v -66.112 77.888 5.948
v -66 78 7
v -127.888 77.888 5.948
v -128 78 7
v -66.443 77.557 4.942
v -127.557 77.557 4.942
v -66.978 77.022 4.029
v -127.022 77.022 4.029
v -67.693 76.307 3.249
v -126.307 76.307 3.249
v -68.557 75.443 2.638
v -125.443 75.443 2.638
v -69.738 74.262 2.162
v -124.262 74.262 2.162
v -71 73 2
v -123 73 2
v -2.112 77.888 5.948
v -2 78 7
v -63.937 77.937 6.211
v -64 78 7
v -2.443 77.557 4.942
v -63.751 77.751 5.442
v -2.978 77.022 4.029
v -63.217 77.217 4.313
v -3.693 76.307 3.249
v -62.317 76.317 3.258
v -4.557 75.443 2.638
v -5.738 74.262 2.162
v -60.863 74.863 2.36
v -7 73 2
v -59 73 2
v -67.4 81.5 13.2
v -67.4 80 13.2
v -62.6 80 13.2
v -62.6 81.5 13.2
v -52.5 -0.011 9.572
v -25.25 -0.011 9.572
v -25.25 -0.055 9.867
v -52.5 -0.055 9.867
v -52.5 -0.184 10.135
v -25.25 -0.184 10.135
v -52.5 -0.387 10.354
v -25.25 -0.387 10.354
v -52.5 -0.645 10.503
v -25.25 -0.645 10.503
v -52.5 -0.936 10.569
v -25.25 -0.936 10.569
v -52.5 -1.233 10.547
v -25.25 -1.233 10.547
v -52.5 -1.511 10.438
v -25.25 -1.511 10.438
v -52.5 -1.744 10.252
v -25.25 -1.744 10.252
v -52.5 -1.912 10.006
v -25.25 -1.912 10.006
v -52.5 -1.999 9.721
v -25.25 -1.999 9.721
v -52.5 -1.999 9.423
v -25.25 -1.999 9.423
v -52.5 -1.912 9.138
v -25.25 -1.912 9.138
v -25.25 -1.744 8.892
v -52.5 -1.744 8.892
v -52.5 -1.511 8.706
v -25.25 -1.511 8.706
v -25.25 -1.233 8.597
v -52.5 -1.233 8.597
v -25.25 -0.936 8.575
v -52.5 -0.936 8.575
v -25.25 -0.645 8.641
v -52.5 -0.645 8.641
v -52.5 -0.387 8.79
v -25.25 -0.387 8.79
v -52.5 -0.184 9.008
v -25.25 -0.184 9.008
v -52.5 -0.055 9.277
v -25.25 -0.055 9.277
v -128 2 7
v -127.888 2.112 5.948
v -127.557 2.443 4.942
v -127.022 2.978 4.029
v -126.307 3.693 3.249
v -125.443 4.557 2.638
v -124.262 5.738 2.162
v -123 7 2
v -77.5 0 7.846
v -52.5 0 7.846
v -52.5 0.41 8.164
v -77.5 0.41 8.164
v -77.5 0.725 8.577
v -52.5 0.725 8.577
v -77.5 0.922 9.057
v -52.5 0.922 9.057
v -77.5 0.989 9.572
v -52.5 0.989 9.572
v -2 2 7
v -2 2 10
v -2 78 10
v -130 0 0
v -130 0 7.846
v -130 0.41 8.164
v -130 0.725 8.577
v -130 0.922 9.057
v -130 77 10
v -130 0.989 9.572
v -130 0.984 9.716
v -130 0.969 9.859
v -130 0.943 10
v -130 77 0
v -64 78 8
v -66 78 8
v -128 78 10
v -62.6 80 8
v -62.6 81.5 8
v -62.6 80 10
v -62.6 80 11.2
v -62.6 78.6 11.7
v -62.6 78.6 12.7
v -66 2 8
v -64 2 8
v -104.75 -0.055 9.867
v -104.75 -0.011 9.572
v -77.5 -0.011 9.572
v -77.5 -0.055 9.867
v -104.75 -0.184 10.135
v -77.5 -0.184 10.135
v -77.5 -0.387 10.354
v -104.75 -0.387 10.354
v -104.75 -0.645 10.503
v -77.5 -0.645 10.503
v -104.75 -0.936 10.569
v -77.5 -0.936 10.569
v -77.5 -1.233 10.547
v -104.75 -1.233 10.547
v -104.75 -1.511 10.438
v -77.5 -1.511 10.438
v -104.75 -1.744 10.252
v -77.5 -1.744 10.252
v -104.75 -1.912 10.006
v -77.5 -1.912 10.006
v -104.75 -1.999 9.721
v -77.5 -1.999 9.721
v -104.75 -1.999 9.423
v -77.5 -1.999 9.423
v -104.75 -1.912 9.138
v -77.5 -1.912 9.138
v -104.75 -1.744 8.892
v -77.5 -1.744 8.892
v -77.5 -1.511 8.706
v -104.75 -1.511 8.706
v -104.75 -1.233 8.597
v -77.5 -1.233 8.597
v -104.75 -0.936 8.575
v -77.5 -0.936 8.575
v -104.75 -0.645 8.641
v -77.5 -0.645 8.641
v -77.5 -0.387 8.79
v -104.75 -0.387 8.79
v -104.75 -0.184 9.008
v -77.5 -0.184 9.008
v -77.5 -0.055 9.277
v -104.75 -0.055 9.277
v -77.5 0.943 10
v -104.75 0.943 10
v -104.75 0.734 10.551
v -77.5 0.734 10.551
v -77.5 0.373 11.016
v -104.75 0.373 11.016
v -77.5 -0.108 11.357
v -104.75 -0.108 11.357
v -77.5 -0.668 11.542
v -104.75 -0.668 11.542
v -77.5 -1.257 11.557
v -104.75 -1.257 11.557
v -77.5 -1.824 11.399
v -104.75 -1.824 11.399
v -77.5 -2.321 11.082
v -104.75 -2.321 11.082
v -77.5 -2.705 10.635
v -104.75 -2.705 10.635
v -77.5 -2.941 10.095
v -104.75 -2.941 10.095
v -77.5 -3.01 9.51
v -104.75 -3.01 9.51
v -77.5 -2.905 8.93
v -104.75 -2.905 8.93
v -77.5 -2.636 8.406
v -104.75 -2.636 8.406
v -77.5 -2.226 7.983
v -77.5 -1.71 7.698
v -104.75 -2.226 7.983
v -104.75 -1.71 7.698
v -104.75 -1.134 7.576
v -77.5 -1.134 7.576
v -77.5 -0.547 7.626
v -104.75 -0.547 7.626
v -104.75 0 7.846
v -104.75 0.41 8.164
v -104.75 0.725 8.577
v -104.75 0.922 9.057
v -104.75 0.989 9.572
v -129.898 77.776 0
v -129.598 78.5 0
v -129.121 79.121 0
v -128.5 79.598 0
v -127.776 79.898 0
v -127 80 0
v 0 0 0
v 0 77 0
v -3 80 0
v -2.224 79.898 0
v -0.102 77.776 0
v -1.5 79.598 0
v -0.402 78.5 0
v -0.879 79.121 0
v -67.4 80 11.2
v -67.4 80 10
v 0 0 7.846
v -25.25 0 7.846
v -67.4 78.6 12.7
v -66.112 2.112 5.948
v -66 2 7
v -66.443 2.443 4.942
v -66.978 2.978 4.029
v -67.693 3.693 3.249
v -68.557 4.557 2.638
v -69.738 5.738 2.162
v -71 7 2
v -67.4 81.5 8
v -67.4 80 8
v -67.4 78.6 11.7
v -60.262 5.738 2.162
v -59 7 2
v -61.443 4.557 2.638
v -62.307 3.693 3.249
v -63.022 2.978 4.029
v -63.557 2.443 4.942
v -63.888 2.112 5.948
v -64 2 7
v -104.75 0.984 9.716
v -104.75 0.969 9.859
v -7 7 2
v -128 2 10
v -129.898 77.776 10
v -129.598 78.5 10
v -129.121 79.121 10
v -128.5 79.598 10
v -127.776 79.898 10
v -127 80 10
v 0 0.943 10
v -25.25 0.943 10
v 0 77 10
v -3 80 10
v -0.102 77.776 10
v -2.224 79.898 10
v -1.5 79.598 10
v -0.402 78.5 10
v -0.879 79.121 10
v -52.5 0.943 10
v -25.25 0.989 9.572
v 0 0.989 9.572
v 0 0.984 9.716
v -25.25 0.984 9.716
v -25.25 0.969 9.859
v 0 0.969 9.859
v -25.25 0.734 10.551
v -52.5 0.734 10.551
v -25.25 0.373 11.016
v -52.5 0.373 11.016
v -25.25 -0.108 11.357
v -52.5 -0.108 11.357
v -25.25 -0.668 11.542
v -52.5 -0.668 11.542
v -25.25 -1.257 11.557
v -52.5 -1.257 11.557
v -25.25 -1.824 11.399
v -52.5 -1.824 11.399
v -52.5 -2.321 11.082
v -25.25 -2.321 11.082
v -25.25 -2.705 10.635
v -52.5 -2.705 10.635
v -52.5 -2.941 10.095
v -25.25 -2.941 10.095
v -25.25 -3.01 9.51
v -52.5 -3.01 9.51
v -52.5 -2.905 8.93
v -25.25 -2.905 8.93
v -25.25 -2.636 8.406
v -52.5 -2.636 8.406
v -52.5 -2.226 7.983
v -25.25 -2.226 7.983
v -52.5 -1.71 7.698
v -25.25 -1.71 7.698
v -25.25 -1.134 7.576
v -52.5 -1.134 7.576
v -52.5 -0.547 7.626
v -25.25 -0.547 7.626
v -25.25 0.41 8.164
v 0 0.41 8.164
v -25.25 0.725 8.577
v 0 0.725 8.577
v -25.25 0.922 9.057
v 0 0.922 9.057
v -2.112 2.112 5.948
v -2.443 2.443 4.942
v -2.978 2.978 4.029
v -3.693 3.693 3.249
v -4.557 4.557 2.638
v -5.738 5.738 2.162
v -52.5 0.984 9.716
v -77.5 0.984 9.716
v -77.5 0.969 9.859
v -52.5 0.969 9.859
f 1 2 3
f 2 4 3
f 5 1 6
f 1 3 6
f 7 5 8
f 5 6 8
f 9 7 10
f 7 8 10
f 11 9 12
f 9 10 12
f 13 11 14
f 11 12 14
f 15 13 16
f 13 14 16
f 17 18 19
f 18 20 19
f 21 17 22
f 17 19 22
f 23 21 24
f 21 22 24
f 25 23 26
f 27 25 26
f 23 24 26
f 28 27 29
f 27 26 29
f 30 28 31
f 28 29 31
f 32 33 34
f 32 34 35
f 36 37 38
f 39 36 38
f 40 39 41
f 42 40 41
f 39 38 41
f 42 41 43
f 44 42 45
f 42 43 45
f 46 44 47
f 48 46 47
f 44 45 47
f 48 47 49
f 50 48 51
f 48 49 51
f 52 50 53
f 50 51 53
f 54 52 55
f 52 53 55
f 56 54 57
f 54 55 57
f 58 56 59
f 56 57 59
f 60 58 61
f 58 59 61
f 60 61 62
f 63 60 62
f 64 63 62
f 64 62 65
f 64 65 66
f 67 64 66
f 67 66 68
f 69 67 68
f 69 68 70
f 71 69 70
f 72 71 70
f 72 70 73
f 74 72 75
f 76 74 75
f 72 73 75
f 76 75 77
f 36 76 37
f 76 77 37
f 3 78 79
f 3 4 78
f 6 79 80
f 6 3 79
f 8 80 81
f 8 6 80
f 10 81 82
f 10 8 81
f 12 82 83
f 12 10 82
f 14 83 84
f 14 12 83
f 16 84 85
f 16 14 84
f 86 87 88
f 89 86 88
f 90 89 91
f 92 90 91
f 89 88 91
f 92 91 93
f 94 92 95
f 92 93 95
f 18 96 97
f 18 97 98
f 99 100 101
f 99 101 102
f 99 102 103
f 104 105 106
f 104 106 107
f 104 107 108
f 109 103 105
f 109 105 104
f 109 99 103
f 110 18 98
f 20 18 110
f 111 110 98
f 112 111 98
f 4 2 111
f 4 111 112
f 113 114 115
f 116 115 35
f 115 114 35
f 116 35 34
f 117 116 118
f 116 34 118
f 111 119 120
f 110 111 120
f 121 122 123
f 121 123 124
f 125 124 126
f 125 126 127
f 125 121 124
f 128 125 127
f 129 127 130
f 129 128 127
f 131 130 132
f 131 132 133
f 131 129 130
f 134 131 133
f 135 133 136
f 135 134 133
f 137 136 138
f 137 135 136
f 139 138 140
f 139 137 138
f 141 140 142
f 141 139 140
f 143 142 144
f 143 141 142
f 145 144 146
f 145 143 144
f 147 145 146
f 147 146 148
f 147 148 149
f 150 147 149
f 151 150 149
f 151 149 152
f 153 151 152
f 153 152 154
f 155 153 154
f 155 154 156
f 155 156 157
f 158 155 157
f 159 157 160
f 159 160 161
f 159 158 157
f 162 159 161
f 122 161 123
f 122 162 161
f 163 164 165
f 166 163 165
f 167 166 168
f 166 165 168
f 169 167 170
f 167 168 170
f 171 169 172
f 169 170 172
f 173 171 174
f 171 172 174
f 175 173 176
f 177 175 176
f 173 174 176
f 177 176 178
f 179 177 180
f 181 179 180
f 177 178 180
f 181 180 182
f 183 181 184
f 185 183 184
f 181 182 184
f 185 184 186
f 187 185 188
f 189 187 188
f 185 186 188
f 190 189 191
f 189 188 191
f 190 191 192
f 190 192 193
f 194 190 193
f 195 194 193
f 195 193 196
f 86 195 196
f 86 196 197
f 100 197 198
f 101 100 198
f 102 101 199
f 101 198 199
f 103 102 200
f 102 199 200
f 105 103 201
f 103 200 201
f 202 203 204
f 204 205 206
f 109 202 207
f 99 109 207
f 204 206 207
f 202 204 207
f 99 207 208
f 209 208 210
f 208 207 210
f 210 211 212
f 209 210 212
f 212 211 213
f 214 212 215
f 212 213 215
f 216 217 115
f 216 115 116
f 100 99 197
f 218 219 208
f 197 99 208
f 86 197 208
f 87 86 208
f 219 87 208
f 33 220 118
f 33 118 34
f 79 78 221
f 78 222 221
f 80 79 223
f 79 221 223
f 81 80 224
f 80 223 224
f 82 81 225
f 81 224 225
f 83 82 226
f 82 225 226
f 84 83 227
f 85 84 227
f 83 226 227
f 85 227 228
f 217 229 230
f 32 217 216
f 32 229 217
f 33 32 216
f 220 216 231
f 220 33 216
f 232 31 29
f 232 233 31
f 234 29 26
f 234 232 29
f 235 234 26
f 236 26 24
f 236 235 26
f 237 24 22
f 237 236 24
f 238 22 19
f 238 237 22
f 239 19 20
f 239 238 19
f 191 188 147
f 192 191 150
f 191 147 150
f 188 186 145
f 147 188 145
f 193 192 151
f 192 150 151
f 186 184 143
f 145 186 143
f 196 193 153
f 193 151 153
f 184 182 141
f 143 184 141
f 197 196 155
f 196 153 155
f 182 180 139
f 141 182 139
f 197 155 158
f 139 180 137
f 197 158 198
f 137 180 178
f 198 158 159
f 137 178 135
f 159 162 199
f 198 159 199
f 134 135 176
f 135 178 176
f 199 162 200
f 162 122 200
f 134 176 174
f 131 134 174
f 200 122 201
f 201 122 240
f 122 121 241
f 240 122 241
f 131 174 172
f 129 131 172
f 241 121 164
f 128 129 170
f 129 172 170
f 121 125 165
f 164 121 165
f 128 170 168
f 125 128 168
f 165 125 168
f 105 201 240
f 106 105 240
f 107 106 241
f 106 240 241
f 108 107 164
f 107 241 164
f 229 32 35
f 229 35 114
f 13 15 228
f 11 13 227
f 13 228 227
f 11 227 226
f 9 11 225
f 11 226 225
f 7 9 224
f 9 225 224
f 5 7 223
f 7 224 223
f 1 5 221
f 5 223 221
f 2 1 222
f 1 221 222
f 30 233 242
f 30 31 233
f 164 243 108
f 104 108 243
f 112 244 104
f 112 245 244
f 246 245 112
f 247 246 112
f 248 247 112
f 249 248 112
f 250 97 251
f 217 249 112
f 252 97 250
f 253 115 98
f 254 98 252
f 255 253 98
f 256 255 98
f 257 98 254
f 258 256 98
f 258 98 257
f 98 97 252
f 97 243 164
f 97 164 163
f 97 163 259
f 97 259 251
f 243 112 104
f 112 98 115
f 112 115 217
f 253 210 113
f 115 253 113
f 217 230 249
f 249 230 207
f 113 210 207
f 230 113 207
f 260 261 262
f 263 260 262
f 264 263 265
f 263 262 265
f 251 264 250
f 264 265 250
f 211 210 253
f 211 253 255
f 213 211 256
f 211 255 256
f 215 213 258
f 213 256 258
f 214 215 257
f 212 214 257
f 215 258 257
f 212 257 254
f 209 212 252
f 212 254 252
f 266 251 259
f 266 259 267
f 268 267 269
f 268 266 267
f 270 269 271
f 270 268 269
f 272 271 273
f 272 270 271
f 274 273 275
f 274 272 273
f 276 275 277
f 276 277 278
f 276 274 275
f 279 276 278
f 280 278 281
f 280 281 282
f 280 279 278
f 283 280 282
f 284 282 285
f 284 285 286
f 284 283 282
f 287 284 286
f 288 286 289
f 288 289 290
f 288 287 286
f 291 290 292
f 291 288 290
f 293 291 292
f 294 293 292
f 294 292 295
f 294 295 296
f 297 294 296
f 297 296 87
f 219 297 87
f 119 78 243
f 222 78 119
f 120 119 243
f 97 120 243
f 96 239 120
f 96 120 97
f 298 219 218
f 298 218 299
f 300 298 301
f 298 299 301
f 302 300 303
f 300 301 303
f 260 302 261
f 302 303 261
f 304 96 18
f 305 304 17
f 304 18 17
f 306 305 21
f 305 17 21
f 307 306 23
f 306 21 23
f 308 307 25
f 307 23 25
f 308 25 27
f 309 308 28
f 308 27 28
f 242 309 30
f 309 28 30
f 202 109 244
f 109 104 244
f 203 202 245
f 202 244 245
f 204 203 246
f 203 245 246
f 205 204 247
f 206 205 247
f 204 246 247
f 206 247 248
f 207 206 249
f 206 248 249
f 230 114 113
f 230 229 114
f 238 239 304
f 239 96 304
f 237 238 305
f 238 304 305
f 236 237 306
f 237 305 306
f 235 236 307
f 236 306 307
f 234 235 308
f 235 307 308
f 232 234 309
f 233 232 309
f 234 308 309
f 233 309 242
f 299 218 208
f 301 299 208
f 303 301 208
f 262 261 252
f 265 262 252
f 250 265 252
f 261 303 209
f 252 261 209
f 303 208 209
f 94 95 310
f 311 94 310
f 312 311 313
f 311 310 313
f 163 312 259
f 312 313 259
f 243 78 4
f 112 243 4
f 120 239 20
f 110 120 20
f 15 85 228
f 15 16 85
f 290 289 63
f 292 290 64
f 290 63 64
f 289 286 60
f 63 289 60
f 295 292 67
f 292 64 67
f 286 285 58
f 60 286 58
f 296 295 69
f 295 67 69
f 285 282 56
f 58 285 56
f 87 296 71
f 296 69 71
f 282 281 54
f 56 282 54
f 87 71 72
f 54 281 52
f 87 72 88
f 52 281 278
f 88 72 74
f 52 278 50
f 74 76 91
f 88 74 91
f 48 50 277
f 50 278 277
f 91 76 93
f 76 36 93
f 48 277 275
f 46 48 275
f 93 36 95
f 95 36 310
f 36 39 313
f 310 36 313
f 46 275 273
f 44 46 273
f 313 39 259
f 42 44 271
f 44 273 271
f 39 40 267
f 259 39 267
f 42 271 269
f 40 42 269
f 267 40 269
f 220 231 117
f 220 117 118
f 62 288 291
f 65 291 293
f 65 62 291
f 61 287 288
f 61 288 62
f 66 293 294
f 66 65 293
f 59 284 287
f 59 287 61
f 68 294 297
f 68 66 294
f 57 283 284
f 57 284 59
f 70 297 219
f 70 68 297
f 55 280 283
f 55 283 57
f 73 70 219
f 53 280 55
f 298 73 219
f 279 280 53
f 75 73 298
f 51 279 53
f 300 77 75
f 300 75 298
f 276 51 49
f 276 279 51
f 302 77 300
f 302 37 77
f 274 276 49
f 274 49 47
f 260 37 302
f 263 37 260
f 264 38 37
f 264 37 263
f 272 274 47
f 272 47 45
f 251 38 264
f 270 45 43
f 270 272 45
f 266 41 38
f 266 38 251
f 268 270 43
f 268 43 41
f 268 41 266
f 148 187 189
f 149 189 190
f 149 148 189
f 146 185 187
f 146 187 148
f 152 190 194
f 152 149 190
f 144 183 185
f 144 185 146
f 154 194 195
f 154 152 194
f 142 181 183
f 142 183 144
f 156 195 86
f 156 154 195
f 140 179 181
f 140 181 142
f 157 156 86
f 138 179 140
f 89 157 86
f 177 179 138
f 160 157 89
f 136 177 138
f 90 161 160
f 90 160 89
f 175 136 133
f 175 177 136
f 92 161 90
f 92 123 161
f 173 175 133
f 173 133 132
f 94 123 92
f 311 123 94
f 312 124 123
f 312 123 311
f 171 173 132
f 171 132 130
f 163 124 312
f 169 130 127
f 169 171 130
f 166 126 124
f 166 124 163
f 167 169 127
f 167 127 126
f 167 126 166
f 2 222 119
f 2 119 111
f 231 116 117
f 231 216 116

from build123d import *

# Parameters (mm, degrees)
F0_W     = 64
F0_H     = 80
F0_W_2   = 1
F1_DEPTH = 10
F2_T     = -2
F3_DEPTH = 8
F5_DEPTH = 130.001
F6_START = -25.25
F4_R     = 1
F6_DEPTH = 27.25
F8_W     = 1.5
F8_H     = 2
F9_DEPTH = 2.4
F10_R    = 5
F11_R    = 3


# Not quite as in the source:
# - a pattern or mirror of a feature is missing from the dataset's text; its kind, count and spacing are read off the source's solid


with BuildPart() as f1:
    # F0 (on Top) → F1 (new body)
    with BuildSketch(Plane.XY):
        with Locations((-32, 40)):
            Rectangle(F0_W, F0_H)
        with Locations((-64.5, 40)):
            Rectangle(F0_W_2, F0_H)
        with Locations((-65.5, 40)):
            Rectangle(F0_W_2, F0_H)
        with Locations((-98, 40)):
            Rectangle(F0_W, F0_H)
    extrude(amount=F1_DEPTH)

    # F2
    f2_openings = [f1.faces().sort_by_distance(p)[0] for p in [
        (-65, 40, 10),
    ]]
    offset(amount=F2_T, openings=f2_openings)

    # F0 (on Top) → F3 (join)
    with BuildSketch(Plane.XY):
        with Locations((-65.5, 40)):
            Rectangle(F0_W_2, F0_H)
        with Locations((-64.5, 40)):
            Rectangle(F0_W_2, F0_H)
    extrude(amount=F3_DEPTH)

    # F4 (on face) → F5 (cut, through all)
    with BuildSketch(Plane.YZ):
        with BuildLine():
            ThreePointArc((0, 7.8458905733), (0.7245313434, 8.5770948967), (0.9894327009, 9.5717972144))
            ThreePointArc((0.9894327009, 9.5717972144), (0.9778046189, 9.7871506811), (0.9430555853, 10))
            Line((0.9430555853, 10), (0.840551923, 10))
            ThreePointArc((0.840551923, 10), (0.8771729534, 9.7872890681), (0.8894327009, 9.5717972144))
            ThreePointArc((0.8894327009, 9.5717972144), (0.6522733229, 8.6525795765), (0, 7.9628367631))
            Line((0, 7.9628367631), (0, 7.8458905733))
        make_face()
        with BuildLine():
            ThreePointArc((0.8894327009, 9.5717972144), (0.8771729534, 9.7872890681), (0.840551923, 10))
            Line((0.840551923, 10), (0, 10))
            Line((0, 10), (0, 7.9628367631))
            ThreePointArc((0, 7.9628367631), (0.6522733229, 8.6525795765), (0.8894327009, 9.5717972144))
        make_face()
    extrude(amount=-F5_DEPTH, mode=Mode.SUBTRACT)

    # F4 (on face) → F6 (join)
    with BuildSketch(Plane.YZ.offset(F6_START)):
        with BuildLine():
            ThreePointArc((0, 7.8458905733), (0.7245313434, 8.5770948967), (0.9894327009, 9.5717972144))
            ThreePointArc((0.9894327009, 9.5717972144), (0.9778046189, 9.7871506811), (0.9430555853, 10))
            Line((0.9430555853, 10), (0.840551923, 10))
            ThreePointArc((0.840551923, 10), (0.8771729534, 9.7872890681), (0.8894327009, 9.5717972144))
            ThreePointArc((0.8894327009, 9.5717972144), (0.6522733229, 8.6525795765), (0, 7.9628367631))
            Line((0, 7.9628367631), (0, 7.8458905733))
        make_face()
        with BuildLine():
            Line((0.840551923, 10), (0.9430555853, 10))
            ThreePointArc((0.9430555853, 10), (-2.8426843031, 10.3738865383), (0, 7.8458905733))
            Line((0, 7.8458905733), (0, 7.9628367631))
            ThreePointArc((0, 7.9628367631), (-2.7669331351, 10.2964895976), (0.840551923, 10))
        make_face()
        with BuildLine():
            ThreePointArc((0.8894327009, 9.5717972144), (0.8771729534, 9.7872890681), (0.840551923, 10))
            Line((0.840551923, 10), (0, 10))
            Line((0, 10), (0, 7.9628367631))
            ThreePointArc((0, 7.9628367631), (0.6522733229, 8.6525795765), (0.8894327009, 9.5717972144))
        make_face()
        with BuildLine():
            Line((0, 10), (0.840551923, 10))
            ThreePointArc((0.840551923, 10), (-2.7669331351, 10.2964895976), (0, 7.9628367631))
            Line((0, 7.9628367631), (0, 10))
        make_face()
        with Locations((-1.0105672991, 9.5717972144)):
            Circle(F4_R, mode=Mode.SUBTRACT)
    f6 = extrude(amount=-F6_DEPTH)

    # F6_copies: F6 across plane
    add(f6.mirror(Plane(origin=(-65, 0, 0), x_dir=(0, 0, -1), z_dir=(-1, 0, 0))))

    # F8 (on mid) → F9 (join, symmetric)
    with BuildSketch(Plane(origin=(-65, 0, 0), x_dir=(0, -1, 0), z_dir=(-1, 0, 0))):
        Polygon((-80, 13.2), (-80, 11.2), (-78.6, 11.7), (-78.6, 12.7), align=None)
        Polygon((-81.5, 10), (-80, 10), (-80, 11.2), (-80, 13.2), (-81.5, 13.2), align=None)
        with Locations((-80.75, 9)):
            Rectangle(F8_W, F8_H)
    extrude(amount=F9_DEPTH, both=True)

    # F10
    f10_edges = [f1.edges().sort_by_distance(p)[0] for p in [
        (-33, 2, 2),
        (-64, 40, 2),
        (-33, 78, 2),
        (-2, 40, 2),
        (-97, 2, 2),
        (-128, 40, 2),
        (-97, 78, 2),
        (-66, 40, 2),
    ]]
    fillet(f10_edges, radius=F10_R)

    # F11
    f11_edges = [f1.edges().sort_by_distance(p)[0] for p in [
        (-130, 80, 5),
        (0, 80, 5),
    ]]
    fillet(f11_edges, radius=F11_R)


solid = f1.part
